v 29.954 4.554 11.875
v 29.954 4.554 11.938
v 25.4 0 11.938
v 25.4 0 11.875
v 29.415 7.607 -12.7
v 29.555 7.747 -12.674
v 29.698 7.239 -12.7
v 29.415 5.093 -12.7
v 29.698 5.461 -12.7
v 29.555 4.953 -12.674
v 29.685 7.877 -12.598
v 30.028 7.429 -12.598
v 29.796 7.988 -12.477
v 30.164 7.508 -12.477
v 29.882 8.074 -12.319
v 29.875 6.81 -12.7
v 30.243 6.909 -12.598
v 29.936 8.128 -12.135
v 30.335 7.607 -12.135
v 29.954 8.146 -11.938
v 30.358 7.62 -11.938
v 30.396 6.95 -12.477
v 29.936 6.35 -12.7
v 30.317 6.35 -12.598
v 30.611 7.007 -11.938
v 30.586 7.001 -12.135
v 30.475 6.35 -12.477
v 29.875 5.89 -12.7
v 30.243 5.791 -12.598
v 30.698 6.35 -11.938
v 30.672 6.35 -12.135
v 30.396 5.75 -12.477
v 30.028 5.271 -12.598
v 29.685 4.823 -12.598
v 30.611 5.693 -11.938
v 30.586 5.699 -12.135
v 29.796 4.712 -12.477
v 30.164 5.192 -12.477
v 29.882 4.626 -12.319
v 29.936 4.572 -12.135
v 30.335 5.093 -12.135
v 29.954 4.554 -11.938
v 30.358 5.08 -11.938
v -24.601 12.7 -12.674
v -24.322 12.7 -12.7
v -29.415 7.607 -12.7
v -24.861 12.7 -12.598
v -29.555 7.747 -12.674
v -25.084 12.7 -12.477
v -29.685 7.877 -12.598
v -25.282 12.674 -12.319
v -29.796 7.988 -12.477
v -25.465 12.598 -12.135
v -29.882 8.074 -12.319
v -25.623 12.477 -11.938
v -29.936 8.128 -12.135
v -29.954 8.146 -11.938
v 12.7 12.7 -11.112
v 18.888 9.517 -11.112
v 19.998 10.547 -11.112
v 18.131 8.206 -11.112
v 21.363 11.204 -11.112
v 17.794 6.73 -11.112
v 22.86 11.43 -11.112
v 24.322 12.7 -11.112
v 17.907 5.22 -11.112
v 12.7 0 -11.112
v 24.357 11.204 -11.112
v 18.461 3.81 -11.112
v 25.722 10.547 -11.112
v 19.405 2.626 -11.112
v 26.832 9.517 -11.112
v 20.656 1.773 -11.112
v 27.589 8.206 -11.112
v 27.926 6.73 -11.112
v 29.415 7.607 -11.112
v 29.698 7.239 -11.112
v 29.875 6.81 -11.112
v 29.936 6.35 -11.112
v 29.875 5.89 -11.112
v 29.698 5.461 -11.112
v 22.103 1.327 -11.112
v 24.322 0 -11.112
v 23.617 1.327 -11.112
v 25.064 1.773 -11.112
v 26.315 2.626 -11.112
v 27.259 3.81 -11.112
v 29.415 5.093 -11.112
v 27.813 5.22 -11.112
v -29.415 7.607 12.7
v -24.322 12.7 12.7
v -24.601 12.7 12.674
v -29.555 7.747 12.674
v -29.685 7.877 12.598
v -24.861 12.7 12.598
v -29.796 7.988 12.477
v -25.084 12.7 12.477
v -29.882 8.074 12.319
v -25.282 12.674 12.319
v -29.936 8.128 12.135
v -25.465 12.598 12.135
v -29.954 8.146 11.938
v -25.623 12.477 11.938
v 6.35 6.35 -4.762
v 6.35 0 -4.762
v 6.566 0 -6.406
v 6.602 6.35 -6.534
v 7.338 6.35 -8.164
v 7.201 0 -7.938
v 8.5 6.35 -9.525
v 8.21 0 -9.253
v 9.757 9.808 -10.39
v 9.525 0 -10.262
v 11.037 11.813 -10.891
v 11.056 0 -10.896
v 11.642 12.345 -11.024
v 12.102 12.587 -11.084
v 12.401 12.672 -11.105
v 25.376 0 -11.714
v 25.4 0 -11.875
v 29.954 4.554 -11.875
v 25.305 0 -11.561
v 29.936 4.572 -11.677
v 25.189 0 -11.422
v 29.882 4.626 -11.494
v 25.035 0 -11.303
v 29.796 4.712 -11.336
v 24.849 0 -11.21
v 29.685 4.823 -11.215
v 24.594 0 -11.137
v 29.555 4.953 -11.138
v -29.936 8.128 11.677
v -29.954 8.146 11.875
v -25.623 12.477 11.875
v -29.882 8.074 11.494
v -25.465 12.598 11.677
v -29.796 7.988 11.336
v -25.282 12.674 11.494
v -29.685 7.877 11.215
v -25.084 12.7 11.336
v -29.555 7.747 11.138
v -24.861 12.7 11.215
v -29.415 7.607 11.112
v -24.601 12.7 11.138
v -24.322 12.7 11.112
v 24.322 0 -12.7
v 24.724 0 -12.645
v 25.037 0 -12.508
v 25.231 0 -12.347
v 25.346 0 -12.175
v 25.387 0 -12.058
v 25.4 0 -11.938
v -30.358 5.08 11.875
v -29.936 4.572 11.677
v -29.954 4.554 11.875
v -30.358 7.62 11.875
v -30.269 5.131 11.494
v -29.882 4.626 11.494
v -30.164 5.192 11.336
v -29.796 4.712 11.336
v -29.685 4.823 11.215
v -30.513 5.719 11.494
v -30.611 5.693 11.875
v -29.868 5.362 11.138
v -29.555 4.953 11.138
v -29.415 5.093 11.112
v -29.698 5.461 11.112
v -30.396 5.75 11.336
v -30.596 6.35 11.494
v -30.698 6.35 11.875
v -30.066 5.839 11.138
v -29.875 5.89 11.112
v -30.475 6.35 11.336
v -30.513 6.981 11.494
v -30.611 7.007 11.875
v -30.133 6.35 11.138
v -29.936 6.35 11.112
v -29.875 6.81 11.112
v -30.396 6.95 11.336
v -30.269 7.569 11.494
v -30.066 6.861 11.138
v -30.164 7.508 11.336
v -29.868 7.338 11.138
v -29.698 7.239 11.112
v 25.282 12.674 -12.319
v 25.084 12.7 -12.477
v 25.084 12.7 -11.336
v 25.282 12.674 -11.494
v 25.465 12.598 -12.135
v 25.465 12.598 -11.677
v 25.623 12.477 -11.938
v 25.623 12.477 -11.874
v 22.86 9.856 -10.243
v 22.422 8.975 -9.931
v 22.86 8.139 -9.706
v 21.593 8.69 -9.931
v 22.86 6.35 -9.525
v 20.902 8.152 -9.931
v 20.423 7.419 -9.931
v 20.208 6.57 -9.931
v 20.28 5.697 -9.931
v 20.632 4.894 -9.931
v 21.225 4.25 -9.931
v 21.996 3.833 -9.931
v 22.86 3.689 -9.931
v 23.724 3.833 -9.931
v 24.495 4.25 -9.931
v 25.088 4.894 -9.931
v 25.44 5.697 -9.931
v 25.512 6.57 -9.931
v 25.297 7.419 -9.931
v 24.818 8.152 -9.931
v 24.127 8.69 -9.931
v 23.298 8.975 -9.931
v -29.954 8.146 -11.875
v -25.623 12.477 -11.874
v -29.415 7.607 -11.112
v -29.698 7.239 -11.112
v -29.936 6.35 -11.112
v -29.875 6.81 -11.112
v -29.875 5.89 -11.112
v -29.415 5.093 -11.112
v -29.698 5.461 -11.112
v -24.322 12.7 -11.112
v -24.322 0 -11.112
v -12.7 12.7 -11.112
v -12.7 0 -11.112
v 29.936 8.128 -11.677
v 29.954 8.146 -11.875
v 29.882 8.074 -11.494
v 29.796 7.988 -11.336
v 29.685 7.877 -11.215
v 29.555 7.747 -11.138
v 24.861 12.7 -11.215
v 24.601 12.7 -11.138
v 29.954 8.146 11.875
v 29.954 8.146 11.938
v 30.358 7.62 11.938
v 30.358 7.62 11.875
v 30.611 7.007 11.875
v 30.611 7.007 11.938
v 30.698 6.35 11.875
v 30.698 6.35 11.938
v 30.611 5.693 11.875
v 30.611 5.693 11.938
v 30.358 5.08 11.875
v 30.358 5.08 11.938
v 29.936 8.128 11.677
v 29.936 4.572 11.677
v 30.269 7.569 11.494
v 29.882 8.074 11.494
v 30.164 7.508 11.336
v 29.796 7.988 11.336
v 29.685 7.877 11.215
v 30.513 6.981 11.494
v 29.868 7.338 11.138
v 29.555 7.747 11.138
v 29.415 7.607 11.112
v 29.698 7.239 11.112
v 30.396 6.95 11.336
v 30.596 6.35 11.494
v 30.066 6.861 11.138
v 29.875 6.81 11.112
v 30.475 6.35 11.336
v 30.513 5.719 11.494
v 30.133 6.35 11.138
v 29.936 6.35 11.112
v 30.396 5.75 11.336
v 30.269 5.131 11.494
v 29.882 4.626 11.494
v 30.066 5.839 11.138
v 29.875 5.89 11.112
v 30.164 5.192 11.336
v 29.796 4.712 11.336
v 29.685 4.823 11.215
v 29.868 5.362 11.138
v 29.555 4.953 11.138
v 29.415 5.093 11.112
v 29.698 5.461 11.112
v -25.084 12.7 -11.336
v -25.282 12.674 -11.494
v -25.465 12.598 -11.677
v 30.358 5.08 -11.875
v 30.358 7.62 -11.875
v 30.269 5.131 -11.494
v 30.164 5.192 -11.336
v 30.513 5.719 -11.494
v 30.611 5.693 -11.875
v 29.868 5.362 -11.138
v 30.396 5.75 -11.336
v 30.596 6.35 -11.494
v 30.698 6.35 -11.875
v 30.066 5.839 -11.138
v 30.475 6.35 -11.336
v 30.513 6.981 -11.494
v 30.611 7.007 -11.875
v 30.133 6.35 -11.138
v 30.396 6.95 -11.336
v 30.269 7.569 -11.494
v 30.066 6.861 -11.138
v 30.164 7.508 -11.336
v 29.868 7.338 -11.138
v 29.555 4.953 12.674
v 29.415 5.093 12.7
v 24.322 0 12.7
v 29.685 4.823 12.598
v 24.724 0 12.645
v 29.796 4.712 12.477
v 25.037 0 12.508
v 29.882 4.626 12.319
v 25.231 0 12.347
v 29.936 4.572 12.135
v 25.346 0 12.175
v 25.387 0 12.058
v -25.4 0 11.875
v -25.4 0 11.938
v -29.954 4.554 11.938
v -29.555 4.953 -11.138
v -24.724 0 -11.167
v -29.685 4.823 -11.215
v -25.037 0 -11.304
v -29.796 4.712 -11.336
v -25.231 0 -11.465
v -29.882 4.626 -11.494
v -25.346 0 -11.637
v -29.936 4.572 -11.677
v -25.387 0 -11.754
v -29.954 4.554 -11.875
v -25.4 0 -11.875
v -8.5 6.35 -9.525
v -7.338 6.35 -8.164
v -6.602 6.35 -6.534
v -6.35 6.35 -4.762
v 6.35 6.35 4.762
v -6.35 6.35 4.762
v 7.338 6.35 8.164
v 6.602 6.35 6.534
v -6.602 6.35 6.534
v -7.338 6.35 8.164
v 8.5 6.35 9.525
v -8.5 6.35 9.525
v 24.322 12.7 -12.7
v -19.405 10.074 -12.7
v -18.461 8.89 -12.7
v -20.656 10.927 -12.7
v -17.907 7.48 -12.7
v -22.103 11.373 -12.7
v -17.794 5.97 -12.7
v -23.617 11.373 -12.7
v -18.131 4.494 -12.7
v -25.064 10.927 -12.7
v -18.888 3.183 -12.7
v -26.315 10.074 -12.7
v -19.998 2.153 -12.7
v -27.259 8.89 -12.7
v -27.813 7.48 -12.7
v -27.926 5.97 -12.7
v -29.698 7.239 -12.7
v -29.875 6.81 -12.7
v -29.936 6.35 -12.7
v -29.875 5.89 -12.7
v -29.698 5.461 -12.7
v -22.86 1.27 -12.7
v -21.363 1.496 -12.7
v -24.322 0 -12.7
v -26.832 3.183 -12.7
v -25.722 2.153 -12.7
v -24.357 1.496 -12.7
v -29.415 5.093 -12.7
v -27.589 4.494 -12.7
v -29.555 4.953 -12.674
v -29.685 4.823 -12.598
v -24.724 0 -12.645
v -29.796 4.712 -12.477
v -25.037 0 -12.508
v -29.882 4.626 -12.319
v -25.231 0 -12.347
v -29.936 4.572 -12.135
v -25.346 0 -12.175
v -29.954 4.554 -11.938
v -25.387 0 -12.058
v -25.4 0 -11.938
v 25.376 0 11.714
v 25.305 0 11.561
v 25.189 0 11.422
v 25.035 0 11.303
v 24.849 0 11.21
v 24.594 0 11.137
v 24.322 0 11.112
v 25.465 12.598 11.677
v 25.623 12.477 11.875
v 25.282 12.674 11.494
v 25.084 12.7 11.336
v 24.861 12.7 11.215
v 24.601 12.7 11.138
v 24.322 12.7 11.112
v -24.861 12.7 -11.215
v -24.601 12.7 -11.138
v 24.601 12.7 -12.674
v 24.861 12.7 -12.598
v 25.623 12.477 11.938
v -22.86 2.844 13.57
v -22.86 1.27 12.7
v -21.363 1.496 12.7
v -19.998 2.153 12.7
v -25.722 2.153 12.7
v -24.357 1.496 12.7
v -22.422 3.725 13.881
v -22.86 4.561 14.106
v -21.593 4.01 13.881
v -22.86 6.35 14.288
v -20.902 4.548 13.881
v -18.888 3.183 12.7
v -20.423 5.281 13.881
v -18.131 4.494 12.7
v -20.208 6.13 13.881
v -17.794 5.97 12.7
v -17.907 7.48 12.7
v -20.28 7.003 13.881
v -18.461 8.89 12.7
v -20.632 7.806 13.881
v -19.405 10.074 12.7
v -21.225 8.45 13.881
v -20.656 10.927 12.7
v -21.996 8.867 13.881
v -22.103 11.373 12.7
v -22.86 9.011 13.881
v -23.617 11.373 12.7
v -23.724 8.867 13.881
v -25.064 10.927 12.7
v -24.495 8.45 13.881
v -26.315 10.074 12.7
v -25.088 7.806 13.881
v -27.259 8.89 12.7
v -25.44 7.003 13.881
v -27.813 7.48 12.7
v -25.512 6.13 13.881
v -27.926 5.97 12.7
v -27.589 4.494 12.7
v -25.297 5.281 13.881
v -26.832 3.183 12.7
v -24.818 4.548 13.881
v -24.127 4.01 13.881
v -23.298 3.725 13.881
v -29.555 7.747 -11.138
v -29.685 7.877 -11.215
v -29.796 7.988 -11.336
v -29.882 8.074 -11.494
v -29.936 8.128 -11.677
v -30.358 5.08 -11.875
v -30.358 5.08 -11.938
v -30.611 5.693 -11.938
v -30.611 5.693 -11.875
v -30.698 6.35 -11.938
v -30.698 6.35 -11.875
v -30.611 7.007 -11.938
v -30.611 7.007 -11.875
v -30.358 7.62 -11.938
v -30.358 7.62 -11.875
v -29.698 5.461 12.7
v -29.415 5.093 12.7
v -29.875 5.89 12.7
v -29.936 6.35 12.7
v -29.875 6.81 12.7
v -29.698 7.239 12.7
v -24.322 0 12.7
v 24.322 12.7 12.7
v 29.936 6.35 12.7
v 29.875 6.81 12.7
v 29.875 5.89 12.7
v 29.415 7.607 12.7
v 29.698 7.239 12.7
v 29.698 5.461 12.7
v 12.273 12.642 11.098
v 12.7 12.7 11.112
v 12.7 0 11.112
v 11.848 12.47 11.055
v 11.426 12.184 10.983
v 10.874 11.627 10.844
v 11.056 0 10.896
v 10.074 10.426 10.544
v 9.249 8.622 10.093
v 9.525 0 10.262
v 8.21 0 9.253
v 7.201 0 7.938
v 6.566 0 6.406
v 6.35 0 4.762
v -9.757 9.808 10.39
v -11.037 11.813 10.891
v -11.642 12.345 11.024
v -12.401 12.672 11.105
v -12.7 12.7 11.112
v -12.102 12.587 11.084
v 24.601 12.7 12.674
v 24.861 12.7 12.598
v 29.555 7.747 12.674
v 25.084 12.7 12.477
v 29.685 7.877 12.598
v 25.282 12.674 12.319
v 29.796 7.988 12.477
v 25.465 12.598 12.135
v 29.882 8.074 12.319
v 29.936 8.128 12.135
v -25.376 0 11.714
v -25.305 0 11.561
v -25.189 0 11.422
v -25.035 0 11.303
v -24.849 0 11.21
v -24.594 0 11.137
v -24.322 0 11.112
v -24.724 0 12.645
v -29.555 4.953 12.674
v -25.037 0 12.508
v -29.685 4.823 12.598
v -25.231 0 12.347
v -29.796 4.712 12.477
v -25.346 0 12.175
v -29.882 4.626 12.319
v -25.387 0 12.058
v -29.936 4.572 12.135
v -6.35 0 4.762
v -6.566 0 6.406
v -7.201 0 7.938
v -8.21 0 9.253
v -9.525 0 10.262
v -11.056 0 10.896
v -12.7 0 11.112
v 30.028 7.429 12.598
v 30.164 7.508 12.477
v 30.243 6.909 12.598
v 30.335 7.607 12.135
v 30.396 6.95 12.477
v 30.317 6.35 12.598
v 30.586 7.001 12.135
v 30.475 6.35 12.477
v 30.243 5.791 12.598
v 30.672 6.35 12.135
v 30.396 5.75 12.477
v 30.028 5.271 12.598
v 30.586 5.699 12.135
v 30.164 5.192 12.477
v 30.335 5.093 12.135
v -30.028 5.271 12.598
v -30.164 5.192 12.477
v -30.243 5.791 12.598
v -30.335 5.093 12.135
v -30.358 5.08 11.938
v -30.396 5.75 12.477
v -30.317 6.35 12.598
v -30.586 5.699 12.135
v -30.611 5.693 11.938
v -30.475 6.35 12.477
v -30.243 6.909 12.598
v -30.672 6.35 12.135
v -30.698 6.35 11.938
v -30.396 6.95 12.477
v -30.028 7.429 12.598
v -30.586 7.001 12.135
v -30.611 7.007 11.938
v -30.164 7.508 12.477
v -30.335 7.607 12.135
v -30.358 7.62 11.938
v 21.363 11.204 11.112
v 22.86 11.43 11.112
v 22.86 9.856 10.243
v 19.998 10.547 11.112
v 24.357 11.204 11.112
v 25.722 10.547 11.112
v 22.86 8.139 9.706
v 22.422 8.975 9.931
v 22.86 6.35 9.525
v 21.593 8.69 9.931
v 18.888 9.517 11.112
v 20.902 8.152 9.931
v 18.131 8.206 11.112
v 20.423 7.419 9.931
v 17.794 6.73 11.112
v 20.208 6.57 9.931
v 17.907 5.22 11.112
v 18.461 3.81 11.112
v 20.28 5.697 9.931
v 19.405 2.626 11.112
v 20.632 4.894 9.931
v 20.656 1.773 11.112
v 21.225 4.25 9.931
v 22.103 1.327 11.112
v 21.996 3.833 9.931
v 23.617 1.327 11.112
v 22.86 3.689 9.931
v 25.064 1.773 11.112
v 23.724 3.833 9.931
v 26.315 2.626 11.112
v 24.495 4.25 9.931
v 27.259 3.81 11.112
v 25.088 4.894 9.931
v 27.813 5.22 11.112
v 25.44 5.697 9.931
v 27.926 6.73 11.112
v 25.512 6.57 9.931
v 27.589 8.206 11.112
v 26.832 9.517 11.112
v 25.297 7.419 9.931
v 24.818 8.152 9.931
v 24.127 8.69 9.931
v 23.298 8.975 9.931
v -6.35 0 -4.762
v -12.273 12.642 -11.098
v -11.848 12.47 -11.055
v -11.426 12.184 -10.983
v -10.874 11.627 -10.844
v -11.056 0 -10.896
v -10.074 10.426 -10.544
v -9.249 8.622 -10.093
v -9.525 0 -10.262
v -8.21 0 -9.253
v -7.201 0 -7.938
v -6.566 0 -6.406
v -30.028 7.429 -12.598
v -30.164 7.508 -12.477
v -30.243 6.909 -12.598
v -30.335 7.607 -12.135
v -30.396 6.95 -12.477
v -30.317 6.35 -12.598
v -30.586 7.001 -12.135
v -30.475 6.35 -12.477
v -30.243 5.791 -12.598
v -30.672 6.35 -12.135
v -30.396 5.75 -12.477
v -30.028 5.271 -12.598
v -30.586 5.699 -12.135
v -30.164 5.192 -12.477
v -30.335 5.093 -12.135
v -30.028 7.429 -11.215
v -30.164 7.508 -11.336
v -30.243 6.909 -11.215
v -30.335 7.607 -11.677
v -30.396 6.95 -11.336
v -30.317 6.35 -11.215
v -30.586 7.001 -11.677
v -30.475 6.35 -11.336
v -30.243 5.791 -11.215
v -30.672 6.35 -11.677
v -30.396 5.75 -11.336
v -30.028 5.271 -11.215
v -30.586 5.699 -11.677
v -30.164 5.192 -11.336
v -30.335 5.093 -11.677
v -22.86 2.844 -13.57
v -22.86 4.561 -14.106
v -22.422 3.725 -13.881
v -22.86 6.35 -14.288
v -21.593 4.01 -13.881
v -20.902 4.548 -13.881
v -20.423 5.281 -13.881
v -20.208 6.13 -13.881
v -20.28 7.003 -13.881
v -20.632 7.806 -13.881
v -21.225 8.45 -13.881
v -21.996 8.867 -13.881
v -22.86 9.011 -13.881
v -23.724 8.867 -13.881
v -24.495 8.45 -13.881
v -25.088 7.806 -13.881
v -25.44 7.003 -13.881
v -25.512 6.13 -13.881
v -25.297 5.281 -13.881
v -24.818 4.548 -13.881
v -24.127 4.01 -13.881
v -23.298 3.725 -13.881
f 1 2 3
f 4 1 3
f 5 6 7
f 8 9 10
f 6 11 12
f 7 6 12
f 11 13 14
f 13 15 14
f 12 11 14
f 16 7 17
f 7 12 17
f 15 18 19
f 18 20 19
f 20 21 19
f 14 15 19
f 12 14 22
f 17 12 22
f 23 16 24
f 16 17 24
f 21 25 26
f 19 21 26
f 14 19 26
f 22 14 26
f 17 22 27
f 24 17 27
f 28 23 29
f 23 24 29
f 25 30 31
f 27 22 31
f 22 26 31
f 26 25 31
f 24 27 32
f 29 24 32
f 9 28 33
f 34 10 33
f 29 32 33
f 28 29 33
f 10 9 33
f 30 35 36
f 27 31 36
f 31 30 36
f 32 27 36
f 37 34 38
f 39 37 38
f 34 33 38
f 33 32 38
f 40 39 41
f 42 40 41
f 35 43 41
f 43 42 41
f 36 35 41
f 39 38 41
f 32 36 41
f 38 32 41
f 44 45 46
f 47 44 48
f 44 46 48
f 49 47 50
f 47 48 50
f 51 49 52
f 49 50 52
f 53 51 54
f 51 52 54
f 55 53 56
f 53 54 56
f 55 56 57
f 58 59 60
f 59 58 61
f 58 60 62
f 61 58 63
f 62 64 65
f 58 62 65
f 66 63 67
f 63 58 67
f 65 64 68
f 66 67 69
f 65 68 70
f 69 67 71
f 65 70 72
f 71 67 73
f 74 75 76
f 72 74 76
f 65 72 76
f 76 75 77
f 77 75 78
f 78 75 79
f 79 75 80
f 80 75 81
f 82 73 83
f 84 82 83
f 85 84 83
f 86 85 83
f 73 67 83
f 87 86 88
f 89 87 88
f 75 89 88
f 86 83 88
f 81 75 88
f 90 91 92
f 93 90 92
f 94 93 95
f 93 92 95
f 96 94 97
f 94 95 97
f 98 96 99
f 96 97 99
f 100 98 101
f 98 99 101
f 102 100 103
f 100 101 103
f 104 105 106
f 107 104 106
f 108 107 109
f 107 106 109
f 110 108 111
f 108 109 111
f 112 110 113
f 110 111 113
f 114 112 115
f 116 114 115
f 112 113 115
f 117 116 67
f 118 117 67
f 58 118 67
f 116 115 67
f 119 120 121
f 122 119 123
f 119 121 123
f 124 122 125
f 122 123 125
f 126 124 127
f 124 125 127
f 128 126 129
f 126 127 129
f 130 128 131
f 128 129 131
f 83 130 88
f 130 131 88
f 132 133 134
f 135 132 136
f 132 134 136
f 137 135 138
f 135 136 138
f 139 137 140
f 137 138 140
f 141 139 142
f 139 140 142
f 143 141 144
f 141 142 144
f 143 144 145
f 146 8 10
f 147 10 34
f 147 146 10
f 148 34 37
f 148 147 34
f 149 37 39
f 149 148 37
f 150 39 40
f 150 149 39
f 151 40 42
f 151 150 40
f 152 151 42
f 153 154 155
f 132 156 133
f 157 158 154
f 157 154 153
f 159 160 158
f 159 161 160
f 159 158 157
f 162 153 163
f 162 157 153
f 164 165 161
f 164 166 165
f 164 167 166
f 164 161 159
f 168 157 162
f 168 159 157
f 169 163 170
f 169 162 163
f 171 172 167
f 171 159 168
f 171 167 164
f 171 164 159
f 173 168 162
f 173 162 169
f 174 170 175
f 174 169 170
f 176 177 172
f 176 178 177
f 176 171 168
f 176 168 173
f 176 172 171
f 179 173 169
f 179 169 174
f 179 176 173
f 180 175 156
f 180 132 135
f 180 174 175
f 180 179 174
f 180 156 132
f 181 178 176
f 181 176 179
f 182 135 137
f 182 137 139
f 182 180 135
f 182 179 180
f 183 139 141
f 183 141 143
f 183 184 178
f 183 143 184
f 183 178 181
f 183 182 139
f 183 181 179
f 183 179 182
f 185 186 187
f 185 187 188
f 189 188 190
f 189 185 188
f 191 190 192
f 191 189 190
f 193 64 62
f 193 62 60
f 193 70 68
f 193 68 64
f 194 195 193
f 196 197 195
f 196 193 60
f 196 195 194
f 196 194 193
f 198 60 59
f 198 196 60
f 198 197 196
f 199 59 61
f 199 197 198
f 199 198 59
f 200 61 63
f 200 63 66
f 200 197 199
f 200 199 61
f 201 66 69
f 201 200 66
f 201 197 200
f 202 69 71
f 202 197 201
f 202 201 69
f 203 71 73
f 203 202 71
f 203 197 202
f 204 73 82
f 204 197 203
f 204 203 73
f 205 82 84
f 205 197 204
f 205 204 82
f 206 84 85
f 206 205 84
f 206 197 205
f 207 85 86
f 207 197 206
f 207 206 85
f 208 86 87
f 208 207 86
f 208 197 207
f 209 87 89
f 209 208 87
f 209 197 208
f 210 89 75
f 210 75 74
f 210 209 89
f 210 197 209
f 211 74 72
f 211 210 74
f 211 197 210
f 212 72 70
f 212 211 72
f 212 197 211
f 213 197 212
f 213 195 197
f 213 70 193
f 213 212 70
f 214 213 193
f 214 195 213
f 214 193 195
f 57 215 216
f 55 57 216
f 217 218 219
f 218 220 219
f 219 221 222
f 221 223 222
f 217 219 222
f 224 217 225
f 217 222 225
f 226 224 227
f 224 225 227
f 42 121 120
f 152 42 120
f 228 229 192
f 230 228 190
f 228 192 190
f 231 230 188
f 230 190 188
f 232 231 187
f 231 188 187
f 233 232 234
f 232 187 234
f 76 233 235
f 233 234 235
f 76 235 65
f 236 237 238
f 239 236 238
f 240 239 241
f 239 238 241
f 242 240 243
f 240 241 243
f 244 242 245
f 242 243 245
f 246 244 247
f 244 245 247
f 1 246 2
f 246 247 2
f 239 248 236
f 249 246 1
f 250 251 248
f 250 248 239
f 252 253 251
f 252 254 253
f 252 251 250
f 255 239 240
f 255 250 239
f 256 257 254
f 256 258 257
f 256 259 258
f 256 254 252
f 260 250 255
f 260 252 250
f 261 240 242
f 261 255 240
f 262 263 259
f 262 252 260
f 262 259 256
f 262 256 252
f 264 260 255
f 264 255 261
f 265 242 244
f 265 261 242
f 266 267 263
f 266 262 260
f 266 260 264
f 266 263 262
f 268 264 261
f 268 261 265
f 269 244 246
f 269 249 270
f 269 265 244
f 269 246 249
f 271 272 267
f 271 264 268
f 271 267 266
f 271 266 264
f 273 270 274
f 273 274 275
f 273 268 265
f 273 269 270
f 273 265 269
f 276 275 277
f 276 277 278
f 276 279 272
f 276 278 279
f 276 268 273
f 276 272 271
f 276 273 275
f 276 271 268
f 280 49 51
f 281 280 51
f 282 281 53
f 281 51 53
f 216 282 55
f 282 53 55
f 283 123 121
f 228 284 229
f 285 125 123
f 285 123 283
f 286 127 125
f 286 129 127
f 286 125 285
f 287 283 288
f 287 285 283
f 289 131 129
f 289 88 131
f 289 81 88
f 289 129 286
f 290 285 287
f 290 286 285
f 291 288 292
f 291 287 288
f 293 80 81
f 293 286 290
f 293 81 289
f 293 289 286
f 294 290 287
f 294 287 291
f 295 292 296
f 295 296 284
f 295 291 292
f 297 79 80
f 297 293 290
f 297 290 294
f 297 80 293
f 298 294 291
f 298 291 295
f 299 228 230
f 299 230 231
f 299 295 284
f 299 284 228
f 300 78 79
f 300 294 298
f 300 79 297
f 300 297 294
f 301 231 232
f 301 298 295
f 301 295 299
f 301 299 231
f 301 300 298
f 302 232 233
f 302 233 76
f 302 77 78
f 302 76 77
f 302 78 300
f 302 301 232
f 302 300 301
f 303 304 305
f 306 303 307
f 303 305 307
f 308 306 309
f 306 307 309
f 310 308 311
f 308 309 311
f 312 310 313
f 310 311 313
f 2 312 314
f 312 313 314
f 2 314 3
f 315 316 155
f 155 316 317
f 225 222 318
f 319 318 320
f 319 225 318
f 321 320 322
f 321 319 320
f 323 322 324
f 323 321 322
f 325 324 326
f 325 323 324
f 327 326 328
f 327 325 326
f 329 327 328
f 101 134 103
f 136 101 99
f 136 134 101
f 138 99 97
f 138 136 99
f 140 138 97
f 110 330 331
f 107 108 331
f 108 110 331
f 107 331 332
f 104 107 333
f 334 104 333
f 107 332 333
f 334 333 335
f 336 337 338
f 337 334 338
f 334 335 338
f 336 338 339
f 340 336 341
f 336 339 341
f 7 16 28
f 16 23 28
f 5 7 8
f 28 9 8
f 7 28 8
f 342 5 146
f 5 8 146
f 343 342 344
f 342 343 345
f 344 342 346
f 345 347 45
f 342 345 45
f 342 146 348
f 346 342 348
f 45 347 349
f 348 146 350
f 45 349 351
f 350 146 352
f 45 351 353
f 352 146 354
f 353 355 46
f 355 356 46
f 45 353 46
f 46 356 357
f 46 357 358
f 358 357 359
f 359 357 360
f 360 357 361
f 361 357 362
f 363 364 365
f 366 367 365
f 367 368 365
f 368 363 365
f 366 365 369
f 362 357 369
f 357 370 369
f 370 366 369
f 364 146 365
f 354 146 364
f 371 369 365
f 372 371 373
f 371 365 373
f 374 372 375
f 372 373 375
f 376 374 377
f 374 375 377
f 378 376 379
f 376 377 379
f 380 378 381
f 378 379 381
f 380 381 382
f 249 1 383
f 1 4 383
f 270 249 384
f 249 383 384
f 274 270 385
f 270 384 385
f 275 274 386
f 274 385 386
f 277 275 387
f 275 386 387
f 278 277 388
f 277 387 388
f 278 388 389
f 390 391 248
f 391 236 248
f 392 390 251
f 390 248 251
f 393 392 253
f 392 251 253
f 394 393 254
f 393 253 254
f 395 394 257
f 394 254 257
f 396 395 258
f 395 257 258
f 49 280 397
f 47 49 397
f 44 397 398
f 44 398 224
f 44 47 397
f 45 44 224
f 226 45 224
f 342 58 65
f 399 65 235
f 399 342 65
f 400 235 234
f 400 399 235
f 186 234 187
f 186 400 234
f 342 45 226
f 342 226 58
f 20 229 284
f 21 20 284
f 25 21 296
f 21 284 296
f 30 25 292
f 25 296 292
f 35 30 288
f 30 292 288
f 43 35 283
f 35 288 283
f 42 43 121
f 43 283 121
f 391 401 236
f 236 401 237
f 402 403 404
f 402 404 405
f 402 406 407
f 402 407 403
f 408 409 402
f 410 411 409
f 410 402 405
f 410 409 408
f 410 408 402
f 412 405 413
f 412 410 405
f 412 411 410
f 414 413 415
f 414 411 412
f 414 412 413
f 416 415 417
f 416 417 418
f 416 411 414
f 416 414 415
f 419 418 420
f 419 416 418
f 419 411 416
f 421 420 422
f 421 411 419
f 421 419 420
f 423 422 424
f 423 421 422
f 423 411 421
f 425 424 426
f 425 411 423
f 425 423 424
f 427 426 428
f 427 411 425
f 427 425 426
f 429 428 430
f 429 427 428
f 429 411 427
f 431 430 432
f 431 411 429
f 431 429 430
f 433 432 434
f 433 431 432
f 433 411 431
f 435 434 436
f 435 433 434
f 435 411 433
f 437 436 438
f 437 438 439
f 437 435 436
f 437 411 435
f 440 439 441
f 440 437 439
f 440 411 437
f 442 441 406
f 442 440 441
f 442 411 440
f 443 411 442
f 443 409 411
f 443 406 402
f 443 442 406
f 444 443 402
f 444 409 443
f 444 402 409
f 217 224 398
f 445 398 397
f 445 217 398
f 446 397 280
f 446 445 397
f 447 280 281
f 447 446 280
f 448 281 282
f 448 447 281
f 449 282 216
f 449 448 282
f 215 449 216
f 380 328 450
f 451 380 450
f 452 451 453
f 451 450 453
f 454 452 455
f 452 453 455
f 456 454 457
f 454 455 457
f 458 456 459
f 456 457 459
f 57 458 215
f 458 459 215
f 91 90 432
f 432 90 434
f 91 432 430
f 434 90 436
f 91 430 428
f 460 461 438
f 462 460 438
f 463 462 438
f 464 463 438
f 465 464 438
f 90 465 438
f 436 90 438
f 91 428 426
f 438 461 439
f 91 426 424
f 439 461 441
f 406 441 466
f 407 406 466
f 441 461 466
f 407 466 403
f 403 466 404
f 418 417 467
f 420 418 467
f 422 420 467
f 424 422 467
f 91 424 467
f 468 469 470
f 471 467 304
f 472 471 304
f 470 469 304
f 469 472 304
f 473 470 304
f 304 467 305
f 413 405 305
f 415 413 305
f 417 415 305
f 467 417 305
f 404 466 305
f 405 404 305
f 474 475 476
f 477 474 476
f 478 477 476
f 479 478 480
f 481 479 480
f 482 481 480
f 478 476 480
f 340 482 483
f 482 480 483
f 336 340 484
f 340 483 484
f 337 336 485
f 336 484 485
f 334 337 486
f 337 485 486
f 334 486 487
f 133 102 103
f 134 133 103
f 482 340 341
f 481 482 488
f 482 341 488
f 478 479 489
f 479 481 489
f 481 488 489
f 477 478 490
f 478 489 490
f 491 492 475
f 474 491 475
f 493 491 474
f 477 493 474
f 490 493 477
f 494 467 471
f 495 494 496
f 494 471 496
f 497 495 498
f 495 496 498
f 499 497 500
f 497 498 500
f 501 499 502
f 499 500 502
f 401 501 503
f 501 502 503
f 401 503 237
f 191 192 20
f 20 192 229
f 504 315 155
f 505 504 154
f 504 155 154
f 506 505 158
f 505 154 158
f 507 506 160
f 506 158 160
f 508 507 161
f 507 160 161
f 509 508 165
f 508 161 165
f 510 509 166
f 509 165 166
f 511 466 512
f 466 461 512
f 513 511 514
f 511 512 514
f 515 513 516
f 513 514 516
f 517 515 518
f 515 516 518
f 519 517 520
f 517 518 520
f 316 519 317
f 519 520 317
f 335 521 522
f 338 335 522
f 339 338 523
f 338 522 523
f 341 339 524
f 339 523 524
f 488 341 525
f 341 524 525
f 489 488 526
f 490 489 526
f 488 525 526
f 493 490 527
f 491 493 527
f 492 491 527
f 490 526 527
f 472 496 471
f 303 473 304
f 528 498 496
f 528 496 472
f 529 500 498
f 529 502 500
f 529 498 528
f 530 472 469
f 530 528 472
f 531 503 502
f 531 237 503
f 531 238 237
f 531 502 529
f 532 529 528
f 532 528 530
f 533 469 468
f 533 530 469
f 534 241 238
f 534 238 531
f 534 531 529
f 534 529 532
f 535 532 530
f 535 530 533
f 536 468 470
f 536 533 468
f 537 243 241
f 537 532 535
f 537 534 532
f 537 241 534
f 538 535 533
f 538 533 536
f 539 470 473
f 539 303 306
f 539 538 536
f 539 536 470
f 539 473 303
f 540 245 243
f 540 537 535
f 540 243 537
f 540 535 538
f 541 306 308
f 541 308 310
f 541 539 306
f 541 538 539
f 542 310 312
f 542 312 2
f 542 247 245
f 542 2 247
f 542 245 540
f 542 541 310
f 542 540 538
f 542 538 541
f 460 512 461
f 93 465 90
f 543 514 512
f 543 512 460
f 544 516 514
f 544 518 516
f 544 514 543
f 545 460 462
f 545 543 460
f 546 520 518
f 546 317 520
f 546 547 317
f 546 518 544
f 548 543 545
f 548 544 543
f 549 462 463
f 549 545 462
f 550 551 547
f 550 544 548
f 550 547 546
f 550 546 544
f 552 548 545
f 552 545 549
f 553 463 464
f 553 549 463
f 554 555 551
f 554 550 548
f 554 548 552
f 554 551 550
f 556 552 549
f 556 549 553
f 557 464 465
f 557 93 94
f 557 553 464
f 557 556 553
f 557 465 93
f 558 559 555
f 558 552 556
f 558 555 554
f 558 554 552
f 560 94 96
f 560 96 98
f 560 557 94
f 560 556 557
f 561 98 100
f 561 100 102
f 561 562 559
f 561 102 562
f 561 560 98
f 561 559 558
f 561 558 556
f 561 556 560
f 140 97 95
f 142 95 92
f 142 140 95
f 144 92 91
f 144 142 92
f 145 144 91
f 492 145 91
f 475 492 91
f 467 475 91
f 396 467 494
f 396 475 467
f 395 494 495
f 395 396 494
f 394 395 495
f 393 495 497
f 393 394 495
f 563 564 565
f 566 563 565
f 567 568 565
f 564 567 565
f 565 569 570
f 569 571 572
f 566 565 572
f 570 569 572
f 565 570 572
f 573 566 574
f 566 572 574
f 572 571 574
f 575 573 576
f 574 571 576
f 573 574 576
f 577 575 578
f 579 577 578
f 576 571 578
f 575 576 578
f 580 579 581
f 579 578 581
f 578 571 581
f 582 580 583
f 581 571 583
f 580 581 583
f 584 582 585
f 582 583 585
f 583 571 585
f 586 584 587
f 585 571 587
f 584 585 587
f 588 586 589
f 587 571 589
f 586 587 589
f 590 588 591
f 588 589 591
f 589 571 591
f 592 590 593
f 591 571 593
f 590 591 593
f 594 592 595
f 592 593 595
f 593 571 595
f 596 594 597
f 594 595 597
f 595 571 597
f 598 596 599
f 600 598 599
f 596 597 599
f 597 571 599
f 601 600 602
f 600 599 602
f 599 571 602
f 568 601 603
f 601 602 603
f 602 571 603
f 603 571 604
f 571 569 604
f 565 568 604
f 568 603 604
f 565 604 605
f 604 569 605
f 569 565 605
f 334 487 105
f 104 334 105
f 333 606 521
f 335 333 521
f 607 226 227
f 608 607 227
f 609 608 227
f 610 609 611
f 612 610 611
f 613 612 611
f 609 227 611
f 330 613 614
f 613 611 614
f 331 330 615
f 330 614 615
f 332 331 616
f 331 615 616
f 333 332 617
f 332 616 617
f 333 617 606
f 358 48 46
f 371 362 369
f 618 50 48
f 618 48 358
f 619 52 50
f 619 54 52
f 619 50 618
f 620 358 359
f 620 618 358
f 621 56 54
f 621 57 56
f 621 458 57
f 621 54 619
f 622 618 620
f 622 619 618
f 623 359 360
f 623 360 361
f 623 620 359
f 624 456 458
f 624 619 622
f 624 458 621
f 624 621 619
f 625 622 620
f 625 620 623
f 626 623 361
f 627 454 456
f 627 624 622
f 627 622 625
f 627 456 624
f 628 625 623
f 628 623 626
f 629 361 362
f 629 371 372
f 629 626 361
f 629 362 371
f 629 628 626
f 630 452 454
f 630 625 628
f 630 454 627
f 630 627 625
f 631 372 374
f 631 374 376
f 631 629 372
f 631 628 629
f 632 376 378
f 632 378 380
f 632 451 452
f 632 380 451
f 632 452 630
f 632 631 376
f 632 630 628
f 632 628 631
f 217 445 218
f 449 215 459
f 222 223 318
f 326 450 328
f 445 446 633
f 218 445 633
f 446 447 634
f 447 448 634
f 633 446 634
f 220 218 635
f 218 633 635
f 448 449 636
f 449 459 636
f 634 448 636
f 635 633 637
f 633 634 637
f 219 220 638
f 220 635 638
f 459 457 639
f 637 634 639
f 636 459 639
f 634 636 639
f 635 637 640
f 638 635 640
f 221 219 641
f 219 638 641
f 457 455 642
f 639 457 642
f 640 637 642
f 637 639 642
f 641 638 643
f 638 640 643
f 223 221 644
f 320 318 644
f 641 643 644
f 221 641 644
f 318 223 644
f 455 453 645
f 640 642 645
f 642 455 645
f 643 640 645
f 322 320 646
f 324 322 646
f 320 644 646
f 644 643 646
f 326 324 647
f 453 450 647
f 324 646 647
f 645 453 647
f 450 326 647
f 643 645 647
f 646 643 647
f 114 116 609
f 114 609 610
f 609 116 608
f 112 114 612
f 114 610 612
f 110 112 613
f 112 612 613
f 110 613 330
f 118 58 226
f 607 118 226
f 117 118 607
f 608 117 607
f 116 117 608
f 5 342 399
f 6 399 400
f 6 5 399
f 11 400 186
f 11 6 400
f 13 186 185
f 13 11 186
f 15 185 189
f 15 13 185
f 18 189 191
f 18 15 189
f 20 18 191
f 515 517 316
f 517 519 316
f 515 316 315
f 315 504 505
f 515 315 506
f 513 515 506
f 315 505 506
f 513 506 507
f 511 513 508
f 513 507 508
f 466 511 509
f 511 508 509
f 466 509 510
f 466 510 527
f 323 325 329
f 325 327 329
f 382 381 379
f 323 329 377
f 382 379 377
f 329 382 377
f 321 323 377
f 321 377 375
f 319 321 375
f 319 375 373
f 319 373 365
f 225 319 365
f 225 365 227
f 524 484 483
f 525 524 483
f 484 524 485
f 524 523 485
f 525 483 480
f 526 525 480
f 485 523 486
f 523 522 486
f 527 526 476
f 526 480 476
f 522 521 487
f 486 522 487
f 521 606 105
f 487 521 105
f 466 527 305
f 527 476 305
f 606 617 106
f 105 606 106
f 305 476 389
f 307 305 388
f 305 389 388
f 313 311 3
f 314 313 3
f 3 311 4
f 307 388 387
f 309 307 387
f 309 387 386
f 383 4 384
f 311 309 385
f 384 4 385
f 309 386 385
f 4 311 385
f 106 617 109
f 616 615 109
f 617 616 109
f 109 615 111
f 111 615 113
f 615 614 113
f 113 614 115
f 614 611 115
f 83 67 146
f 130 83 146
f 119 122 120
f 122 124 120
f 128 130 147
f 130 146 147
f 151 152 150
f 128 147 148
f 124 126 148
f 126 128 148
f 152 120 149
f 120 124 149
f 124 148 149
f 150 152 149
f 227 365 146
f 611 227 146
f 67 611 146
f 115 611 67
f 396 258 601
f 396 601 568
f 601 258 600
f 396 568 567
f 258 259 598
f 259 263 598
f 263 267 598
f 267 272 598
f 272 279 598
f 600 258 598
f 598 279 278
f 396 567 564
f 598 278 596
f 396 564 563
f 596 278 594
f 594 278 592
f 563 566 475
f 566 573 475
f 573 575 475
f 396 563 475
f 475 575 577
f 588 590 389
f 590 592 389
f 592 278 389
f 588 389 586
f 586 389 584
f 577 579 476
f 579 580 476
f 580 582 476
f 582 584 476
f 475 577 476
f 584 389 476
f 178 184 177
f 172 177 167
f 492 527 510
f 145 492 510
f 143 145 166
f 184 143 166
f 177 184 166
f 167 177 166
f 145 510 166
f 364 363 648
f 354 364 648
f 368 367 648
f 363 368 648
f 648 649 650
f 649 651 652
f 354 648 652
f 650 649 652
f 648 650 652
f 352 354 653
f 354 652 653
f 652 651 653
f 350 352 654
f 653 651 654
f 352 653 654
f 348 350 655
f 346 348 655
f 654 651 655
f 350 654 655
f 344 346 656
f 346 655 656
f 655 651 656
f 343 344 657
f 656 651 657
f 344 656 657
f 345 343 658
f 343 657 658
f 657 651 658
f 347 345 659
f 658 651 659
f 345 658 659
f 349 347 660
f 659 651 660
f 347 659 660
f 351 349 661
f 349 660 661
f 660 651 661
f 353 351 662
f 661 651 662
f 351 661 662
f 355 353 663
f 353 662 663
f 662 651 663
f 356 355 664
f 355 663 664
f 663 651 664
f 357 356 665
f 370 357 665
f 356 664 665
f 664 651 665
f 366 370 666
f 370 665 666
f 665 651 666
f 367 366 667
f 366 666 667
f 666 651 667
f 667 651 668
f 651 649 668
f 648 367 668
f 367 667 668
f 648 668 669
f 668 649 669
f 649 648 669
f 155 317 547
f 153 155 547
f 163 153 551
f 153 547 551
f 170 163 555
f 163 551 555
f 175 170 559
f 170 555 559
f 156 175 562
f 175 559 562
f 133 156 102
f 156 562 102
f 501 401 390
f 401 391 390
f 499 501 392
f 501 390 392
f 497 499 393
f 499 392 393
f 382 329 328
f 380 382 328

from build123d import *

# Parameters (mm, degrees)
BOSS_EXTRUDE1_DEPTH = 12.7
CUT_EXTRUDE2_DEPTH  = 66.991135768
CUT_EXTRUDE1_DEPTH  = 43.597094971
FILLET1_R           = 0.762


with BuildPart() as part:
    # Sketch1 → Boss-Extrude1 (new body)
    with BuildSketch(Plane(origin=(0, 0, 0), x_dir=(1, 0, 0), z_dir=(0, 1, 0))):
        with BuildLine():
            Line((-31.75, -12.7), (31.75, -12.7))
            Line((31.75, -12.7), (31.75, -11.1125))
            Line((31.75, -11.1125), (12.7, -11.1125))
            ThreePointArc((12.7, -11.1125), (8.209871939, -9.252628061), (6.35, -4.7625))
            Line((6.35, -4.7625), (6.35, 4.7625))
            ThreePointArc((6.35, 4.7625), (8.209871939, 9.252628061), (12.7, 11.1125))
            Line((12.7, 11.1125), (31.75, 11.1125))
            Line((31.75, 11.1125), (31.75, 12.7))
            Line((31.75, 12.7), (-31.75, 12.7))
            Line((-31.75, 12.7), (-31.75, 11.1125))
            Line((-31.75, 11.1125), (-12.7, 11.1125))
            ThreePointArc((-12.7, 11.1125), (-8.209871939, 9.252628061), (-6.35, 4.7625))
            Line((-6.35, 4.7625), (-6.35, -4.7625))
            ThreePointArc((-6.35, -4.7625), (-8.209871939, -9.252628061), (-12.7, -11.1125))
            Line((-12.7, -11.1125), (-31.75, -11.1125))
            Line((-31.75, -11.1125), (-31.75, -12.7))
        make_face()
    extrude(amount=BOSS_EXTRUDE1_DEPTH)

    # Sketch3 → Cut-Extrude2 (cut, through all)
    with BuildSketch(Plane.ZY.offset(31.75)):
        Polygon((11.1125, 12.7), (4.7625, 12.7), (-4.7625, 12.7), (-11.1125, 12.7), (-9.525, 6.35), (9.525, 6.35), align=None)
    extrude(amount=-CUT_EXTRUDE2_DEPTH, mode=Mode.SUBTRACT)

    # Sketch2 → Cut-Extrude1 (cut, through all)
    with BuildSketch(Plane.XY.offset(12.7)):
        with BuildLine():
            ThreePointArc((-29.953948776, 4.553948776), (-30.697897552, 6.35), (-29.953948776, 8.146051224))
            Line((-29.953948776, 8.146051224), (-25.4, 12.7))
            Line((-25.4, 12.7), (-31.75, 12.7))
            Line((-31.75, 12.7), (-31.75, 0))
            Line((-31.75, 0), (-25.4, 0))
            Line((-25.4, 0), (-29.953948776, 4.553948776))
        make_face()
        with BuildLine():
            Line((31.75, 12.7), (25.4, 12.7))
            Line((25.4, 12.7), (29.953948776, 8.146051224))
            ThreePointArc((29.953948776, 8.146051224), (30.697897552, 6.35), (29.953948776, 4.553948776))
            Line((29.953948776, 4.553948776), (25.4, 0))
            Line((25.4, 0), (31.75, 0))
            Line((31.75, 0), (31.75, 12.7))
        make_face()
    extrude(amount=-CUT_EXTRUDE1_DEPTH, mode=Mode.SUBTRACT)

    # Sketch4 → Revolve1 (revolve)
    with BuildSketch(Plane.ZY.offset(22.86), mode=Mode.PRIVATE) as revolve1_sk:
        with BuildLine():
            Line((12.7, 6.35), (12.7, 11.43))
            ThreePointArc((12.7, 11.43), (13.881381744, 9.01113492), (14.2875, 6.35))
            Line((14.2875, 6.35), (12.7, 6.35))
        make_face()
    revolve1 = revolve(revolve1_sk.sketch.rotate(Axis((-22.86, 6.35, 0), (0, 0, 1)), 180), axis=Axis((-22.86, 6.35, 0), (0, 0, 1)))

    # Mirror1: Revolve1 across plane
    add(revolve1.mirror(Plane.XY))

    # Sketch5 → Revolve2 (revolve)
    with BuildSketch(Plane(origin=(22.86, 0, 0), x_dir=(0, 0, -1), z_dir=(1, 0, 0))):
        with BuildLine():
            Line((11.1125, 6.35), (11.1125, 11.43))
            ThreePointArc((11.1125, 11.43), (9.931118256, 9.01113492), (9.525, 6.35))
            Line((9.525, 6.35), (11.1125, 6.35))
        make_face()
    revolve2 = revolve(axis=Axis((22.86, 6.35, -9.525), (0, 0, 1)))

    # Mirror2: Revolve2 across plane
    add(revolve2.mirror(Plane.XY))

    # Fillet1
    fillet1_edges = [part.edges().sort_by_distance(p)[0] for p in [
        (-27.676974388, 10.423025612, 11.1125),
        (-25.4, 12.7, 11.90625),
        (-27.676974388, 2.276974388, 12.7),
        (-30.697897552, 6.35, -11.1125),
        (-30.697897552, 6.35, 11.1125),
        (-27.676974388, 2.276974388, -11.1125),
        (-27.676974388, 2.276974388, 11.1125),
        (-30.697897552, 6.35, -12.7),
        (-27.676974388, 2.276974388, -12.7),
        (-27.676974388, 10.423025612, 12.7),
        (30.697897552, 6.35, 12.7),
        (25.4, 12.7, 11.90625),
        (25.4, 12.7, -11.90625),
        (27.676974388, 10.423025612, 12.7),
        (27.676974388, 2.276974388, 11.1125),
        (27.676974388, 2.276974388, -11.1125),
        (27.676974388, 2.276974388, -12.7),
        (30.697897552, 6.35, 11.1125),
        (27.676974388, 10.423025612, 11.1125),
        (27.676974388, 10.423025612, -11.1125),
        (30.697897552, 6.35, -12.7),
        (27.676974388, 10.423025612, -12.7),
        (27.676974388, 2.276974388, 12.7),
        (30.697897552, 6.35, -11.1125),
        (-30.697897552, 6.35, 12.7),
        (-25.4, 12.7, -11.90625),
        (-27.676974388, 10.423025612, -11.1125),
        (-27.676974388, 10.423025612, -12.7),
    ]]
    fillet(fillet1_edges, radius=FILLET1_R)


solid = part.part
